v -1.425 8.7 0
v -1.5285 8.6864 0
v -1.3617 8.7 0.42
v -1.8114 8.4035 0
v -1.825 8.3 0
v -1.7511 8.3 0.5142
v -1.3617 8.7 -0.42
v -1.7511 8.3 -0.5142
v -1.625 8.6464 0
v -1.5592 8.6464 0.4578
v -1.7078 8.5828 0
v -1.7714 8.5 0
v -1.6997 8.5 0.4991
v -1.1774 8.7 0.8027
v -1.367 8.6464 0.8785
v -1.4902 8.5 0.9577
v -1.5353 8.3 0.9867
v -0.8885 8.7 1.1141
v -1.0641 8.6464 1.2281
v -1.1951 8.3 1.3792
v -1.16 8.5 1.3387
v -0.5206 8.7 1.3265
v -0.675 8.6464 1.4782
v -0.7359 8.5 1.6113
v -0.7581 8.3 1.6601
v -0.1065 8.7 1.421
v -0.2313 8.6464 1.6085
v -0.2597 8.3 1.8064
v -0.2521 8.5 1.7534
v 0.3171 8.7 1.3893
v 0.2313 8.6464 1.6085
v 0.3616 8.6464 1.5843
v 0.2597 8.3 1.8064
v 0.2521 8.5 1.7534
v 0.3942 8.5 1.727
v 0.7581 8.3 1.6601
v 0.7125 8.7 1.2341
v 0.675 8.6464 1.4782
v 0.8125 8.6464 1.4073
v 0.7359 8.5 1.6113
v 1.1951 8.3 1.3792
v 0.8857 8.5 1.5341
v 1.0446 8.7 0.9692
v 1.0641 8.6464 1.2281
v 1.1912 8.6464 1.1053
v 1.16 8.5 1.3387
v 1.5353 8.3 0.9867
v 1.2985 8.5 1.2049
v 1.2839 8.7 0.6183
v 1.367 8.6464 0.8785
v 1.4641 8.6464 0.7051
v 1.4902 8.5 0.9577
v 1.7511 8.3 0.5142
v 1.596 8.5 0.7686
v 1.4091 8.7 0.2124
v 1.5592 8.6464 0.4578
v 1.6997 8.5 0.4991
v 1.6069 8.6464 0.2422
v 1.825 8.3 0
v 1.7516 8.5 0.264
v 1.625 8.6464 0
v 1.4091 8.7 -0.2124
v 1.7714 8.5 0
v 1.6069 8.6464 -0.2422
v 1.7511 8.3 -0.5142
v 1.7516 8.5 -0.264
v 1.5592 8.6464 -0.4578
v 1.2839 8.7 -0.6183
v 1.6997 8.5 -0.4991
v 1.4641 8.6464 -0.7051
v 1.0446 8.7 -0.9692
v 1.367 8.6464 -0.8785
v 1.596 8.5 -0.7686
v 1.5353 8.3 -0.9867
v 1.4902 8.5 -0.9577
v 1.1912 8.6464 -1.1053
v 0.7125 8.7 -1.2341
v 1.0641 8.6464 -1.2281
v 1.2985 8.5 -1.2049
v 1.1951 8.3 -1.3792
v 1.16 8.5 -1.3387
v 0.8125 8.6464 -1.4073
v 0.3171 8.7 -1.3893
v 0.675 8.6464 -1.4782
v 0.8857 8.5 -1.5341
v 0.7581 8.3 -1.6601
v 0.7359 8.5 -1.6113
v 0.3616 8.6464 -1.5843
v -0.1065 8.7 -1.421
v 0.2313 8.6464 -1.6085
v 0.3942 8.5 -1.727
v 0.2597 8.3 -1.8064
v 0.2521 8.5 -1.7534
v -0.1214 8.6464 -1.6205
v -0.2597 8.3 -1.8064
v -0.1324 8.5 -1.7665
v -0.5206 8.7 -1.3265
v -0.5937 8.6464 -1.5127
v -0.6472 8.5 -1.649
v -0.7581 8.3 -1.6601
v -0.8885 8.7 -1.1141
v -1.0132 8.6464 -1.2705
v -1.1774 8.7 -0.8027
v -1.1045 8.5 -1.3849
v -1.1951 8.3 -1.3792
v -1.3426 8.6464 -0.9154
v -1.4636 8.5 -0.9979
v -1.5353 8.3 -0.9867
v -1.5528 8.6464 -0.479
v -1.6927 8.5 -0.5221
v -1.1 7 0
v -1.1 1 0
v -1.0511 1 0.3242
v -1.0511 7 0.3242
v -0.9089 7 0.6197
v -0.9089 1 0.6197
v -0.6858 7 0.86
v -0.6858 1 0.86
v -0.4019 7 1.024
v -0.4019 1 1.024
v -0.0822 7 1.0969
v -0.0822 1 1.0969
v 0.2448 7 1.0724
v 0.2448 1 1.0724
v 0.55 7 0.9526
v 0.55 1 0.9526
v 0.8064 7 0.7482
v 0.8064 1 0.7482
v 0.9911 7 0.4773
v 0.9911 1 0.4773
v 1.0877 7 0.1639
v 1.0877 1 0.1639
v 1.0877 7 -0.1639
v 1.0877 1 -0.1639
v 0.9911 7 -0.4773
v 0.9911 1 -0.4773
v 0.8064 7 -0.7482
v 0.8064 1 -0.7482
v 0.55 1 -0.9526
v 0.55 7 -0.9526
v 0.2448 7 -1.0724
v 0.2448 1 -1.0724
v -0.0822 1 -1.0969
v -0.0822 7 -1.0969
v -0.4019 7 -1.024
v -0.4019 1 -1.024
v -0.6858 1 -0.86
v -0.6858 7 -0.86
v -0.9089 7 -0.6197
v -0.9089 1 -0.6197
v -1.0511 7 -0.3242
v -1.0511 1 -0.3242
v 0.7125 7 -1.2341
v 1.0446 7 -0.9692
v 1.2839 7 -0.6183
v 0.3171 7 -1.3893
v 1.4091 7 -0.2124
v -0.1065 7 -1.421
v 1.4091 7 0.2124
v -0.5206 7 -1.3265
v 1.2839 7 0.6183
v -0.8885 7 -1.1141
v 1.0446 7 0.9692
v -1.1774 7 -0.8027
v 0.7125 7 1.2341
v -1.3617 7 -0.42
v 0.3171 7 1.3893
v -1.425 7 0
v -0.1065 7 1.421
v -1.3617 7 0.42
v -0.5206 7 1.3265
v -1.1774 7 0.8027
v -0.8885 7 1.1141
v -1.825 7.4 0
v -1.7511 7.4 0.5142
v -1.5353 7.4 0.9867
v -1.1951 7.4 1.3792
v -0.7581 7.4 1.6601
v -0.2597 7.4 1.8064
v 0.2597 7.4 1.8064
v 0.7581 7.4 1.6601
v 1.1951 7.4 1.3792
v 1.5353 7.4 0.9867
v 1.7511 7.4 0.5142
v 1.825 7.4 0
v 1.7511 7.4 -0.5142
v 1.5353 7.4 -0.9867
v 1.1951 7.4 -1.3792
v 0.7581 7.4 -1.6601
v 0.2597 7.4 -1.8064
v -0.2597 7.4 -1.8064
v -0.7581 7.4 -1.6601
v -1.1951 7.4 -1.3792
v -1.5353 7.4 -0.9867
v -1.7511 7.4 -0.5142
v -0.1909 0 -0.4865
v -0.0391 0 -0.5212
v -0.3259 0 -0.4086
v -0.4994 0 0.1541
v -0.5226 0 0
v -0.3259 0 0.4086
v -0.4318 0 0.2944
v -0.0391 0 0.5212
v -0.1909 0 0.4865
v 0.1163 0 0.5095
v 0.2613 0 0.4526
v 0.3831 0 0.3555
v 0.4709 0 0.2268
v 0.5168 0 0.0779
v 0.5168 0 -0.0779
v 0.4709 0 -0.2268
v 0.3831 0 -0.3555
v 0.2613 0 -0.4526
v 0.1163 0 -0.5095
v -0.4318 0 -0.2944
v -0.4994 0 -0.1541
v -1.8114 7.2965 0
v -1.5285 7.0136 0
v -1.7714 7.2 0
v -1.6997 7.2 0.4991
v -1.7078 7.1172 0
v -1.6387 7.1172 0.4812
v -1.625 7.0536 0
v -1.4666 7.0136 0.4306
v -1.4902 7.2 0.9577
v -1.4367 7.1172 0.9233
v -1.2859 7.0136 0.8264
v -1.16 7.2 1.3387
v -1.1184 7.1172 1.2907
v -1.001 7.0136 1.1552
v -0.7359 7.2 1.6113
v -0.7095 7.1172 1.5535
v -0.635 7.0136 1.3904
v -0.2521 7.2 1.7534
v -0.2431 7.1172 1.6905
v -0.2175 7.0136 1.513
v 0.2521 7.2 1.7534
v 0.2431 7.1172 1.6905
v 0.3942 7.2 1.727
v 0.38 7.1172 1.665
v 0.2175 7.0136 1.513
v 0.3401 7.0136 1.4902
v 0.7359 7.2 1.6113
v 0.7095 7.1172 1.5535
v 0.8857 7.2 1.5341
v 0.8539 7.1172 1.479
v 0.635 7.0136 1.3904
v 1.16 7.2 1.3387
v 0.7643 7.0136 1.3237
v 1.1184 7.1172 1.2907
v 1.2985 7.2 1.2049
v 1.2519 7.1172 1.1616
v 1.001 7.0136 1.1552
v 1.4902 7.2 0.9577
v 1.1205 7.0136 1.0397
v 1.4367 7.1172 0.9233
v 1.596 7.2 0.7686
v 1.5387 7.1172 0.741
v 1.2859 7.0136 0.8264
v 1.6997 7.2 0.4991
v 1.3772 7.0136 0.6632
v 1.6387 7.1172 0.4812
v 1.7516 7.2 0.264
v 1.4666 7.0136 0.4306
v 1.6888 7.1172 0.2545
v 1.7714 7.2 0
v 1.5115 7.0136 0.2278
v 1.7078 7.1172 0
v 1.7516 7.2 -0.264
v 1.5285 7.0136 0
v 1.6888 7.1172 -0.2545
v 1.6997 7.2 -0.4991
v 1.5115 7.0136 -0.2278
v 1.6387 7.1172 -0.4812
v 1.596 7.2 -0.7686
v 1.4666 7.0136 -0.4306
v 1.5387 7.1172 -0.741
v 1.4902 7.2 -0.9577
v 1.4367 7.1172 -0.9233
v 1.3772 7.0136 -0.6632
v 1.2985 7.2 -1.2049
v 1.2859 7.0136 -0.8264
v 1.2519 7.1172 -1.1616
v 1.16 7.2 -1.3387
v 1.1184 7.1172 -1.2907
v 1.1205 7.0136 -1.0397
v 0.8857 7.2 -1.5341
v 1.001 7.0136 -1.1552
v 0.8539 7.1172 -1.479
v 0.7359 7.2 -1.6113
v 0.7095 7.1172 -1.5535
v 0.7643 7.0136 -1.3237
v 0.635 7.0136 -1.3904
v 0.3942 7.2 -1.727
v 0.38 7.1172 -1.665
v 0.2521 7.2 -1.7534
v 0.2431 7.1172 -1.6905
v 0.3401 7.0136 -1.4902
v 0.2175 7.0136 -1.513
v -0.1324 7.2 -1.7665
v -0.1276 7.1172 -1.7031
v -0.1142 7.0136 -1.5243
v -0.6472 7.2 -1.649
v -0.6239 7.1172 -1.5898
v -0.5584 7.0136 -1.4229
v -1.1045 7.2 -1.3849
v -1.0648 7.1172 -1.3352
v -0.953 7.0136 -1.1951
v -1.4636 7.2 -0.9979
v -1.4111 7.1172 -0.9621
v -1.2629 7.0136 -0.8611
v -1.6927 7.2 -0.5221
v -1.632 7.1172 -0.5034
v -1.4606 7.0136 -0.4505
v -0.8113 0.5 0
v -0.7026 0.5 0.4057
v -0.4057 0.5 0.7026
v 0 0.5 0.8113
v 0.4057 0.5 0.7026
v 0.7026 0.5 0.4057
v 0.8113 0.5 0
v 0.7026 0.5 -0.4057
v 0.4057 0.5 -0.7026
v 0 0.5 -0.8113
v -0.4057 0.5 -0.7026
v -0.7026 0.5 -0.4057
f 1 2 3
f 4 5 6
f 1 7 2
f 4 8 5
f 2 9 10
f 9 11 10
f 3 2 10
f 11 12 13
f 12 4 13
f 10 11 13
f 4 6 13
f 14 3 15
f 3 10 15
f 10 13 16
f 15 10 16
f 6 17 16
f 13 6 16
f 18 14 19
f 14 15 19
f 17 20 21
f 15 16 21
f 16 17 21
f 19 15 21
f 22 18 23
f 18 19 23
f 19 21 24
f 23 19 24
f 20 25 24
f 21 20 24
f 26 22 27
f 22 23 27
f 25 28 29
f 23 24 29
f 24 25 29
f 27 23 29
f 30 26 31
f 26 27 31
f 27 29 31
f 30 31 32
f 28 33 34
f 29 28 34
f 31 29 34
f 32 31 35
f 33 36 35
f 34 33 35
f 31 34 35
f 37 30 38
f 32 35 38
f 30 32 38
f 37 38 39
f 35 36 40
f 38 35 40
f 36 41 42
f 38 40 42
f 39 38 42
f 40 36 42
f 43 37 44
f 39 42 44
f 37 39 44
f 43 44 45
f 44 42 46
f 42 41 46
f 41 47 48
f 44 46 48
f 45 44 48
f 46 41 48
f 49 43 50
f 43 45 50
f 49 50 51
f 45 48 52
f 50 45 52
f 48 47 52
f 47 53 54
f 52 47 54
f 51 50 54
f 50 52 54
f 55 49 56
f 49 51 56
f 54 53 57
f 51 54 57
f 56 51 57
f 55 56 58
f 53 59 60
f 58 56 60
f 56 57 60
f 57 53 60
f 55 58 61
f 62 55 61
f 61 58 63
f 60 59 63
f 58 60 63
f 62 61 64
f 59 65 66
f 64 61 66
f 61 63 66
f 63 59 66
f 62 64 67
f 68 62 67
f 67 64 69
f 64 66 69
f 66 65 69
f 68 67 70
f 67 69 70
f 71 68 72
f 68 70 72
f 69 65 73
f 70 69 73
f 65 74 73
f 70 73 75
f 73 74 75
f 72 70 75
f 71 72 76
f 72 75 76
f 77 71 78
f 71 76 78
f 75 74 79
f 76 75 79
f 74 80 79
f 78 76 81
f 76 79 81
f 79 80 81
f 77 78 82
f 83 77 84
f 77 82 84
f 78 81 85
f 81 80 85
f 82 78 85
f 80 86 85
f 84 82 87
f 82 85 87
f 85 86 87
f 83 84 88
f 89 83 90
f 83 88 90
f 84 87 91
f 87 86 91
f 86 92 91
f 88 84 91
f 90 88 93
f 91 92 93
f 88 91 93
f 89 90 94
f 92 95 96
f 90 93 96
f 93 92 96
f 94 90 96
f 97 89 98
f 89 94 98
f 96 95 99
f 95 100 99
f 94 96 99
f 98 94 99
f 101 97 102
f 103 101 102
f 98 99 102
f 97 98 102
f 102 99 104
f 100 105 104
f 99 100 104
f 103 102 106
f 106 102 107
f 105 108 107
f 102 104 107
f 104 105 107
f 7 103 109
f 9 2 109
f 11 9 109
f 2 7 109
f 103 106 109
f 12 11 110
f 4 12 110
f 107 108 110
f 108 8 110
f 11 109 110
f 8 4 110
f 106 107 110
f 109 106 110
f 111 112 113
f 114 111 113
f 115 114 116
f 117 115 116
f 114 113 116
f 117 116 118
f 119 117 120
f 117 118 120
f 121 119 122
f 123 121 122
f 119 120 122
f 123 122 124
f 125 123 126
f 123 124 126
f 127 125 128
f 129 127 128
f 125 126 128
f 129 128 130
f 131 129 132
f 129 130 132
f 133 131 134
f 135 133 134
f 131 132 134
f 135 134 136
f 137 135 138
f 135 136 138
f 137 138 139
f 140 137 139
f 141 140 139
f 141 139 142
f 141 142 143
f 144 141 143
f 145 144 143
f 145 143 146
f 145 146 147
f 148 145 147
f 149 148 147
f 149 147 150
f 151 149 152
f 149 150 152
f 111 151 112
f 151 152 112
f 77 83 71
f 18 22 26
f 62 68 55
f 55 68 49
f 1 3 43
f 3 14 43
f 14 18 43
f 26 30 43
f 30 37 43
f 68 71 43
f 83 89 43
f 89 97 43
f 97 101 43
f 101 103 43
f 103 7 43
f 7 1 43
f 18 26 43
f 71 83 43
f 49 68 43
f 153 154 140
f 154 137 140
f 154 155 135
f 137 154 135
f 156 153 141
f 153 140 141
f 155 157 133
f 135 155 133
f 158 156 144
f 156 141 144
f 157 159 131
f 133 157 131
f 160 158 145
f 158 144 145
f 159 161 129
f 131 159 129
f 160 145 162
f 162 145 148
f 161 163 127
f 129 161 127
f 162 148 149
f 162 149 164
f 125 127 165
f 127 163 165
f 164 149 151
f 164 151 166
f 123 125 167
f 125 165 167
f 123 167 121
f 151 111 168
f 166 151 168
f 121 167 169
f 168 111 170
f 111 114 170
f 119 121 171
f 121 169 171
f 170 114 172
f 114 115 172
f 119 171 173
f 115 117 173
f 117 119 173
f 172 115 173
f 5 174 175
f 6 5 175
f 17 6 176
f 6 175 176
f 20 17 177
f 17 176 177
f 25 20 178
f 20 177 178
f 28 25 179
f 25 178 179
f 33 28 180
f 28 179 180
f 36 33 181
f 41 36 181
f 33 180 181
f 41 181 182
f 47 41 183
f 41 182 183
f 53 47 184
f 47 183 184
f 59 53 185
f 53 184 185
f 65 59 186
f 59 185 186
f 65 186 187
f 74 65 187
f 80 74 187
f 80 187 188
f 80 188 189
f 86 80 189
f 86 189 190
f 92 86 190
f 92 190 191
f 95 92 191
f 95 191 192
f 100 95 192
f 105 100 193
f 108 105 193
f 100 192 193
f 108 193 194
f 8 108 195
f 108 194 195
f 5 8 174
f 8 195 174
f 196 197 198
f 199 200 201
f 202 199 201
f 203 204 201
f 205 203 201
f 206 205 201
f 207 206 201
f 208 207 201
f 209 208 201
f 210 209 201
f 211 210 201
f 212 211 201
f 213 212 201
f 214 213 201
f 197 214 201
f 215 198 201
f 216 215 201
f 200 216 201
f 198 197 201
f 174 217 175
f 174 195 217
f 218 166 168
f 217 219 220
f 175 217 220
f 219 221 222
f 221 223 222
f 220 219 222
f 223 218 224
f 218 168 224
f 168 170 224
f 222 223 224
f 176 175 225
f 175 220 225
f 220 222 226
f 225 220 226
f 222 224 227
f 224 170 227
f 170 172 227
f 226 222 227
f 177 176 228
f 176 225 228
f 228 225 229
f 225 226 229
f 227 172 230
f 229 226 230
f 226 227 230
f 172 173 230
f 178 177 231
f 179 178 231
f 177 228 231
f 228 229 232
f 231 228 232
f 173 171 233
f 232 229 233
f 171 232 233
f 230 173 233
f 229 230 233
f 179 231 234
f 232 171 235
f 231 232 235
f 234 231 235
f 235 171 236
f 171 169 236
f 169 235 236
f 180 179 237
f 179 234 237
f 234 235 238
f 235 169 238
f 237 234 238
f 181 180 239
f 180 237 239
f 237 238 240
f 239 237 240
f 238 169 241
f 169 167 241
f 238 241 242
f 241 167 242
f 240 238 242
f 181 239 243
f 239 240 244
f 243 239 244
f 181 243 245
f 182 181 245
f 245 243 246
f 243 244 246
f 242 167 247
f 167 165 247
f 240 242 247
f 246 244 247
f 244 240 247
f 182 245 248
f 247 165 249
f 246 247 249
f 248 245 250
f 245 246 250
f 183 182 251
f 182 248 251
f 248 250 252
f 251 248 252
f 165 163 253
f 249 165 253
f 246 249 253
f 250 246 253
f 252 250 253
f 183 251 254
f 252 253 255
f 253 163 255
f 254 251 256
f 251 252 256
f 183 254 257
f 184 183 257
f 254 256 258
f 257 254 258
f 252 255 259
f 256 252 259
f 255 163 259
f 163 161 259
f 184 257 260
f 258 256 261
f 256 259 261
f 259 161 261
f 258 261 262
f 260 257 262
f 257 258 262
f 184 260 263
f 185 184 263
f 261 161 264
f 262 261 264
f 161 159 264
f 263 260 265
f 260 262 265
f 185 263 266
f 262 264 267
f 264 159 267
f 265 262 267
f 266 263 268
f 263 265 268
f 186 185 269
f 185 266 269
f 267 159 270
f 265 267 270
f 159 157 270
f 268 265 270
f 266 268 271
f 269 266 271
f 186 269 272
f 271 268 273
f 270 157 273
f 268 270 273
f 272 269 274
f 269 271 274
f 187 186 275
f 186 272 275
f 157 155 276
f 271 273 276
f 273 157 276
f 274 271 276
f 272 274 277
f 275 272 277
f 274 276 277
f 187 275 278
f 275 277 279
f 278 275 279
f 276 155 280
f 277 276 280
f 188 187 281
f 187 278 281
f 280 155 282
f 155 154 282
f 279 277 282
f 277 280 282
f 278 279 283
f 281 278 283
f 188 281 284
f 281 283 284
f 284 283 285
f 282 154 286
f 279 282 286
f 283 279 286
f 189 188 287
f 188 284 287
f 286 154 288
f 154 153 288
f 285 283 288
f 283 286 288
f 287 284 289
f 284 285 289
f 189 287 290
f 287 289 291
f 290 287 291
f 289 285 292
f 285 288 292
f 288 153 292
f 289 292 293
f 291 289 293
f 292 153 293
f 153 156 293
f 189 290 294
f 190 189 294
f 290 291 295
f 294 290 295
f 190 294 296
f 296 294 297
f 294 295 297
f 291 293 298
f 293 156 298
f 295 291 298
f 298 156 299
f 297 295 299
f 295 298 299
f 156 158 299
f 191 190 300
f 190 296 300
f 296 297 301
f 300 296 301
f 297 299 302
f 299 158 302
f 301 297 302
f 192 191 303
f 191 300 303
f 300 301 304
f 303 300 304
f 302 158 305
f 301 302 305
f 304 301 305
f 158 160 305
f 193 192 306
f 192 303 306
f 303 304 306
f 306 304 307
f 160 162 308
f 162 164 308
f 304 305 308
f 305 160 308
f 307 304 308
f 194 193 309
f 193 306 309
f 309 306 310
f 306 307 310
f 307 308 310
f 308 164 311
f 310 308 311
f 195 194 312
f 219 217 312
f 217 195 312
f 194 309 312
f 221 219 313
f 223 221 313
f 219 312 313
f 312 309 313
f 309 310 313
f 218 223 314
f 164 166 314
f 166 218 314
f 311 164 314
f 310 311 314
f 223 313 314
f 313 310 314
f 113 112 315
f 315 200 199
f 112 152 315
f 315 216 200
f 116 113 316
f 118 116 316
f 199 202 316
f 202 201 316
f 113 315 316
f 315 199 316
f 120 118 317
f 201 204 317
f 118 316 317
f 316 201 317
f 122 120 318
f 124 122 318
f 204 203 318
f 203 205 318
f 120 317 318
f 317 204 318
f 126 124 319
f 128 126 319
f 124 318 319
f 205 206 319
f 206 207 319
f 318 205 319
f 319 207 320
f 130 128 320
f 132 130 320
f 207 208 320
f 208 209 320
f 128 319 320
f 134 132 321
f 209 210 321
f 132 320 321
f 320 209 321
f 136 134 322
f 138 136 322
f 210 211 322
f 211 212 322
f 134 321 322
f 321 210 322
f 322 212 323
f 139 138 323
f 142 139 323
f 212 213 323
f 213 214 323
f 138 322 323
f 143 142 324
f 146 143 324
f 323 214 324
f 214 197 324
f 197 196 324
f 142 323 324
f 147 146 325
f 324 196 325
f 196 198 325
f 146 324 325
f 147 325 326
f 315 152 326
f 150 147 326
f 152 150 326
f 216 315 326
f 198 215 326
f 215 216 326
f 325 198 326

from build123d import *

# Parameters (mm, degrees)
FILLET1_R      = 0.4
CHAMFER1_SIZE  = 1
CHAMFER1_SIZE2 = 0.577350269


with BuildPart() as part:
    # Sketch1 → Revolve2 (revolve)
    with BuildSketch(Plane.XY):
        Polygon((0, 0), (0, 8.7), (-1.825, 8.7), (-1.825, 7), (-1.1, 7), (-1.1, 0), align=None)
    revolve(axis=Axis((0, 0, 0), (0, 1, 0)))

    # Fillet1
    fillet1_edges = [part.edges().sort_by_distance(p)[0] for p in [
        (1.825, 7, 0),
        (1.825, 8.7, 0),
    ]]
    fillet(fillet1_edges, radius=FILLET1_R)

    # Chamfer1
    chamfer1_edges = [part.edges().sort_by_distance(p)[0] for p in [
        (1.1, 0, 0),
    ]]
    chamfer1_side = [part.faces().sort_by_distance(p)[0] for p in [
        (1.1, 3.5, 0),
    ]]
    chamfer(chamfer1_edges, length=CHAMFER1_SIZE, length2=CHAMFER1_SIZE2, reference=chamfer1_side[0])


solid = part.part
